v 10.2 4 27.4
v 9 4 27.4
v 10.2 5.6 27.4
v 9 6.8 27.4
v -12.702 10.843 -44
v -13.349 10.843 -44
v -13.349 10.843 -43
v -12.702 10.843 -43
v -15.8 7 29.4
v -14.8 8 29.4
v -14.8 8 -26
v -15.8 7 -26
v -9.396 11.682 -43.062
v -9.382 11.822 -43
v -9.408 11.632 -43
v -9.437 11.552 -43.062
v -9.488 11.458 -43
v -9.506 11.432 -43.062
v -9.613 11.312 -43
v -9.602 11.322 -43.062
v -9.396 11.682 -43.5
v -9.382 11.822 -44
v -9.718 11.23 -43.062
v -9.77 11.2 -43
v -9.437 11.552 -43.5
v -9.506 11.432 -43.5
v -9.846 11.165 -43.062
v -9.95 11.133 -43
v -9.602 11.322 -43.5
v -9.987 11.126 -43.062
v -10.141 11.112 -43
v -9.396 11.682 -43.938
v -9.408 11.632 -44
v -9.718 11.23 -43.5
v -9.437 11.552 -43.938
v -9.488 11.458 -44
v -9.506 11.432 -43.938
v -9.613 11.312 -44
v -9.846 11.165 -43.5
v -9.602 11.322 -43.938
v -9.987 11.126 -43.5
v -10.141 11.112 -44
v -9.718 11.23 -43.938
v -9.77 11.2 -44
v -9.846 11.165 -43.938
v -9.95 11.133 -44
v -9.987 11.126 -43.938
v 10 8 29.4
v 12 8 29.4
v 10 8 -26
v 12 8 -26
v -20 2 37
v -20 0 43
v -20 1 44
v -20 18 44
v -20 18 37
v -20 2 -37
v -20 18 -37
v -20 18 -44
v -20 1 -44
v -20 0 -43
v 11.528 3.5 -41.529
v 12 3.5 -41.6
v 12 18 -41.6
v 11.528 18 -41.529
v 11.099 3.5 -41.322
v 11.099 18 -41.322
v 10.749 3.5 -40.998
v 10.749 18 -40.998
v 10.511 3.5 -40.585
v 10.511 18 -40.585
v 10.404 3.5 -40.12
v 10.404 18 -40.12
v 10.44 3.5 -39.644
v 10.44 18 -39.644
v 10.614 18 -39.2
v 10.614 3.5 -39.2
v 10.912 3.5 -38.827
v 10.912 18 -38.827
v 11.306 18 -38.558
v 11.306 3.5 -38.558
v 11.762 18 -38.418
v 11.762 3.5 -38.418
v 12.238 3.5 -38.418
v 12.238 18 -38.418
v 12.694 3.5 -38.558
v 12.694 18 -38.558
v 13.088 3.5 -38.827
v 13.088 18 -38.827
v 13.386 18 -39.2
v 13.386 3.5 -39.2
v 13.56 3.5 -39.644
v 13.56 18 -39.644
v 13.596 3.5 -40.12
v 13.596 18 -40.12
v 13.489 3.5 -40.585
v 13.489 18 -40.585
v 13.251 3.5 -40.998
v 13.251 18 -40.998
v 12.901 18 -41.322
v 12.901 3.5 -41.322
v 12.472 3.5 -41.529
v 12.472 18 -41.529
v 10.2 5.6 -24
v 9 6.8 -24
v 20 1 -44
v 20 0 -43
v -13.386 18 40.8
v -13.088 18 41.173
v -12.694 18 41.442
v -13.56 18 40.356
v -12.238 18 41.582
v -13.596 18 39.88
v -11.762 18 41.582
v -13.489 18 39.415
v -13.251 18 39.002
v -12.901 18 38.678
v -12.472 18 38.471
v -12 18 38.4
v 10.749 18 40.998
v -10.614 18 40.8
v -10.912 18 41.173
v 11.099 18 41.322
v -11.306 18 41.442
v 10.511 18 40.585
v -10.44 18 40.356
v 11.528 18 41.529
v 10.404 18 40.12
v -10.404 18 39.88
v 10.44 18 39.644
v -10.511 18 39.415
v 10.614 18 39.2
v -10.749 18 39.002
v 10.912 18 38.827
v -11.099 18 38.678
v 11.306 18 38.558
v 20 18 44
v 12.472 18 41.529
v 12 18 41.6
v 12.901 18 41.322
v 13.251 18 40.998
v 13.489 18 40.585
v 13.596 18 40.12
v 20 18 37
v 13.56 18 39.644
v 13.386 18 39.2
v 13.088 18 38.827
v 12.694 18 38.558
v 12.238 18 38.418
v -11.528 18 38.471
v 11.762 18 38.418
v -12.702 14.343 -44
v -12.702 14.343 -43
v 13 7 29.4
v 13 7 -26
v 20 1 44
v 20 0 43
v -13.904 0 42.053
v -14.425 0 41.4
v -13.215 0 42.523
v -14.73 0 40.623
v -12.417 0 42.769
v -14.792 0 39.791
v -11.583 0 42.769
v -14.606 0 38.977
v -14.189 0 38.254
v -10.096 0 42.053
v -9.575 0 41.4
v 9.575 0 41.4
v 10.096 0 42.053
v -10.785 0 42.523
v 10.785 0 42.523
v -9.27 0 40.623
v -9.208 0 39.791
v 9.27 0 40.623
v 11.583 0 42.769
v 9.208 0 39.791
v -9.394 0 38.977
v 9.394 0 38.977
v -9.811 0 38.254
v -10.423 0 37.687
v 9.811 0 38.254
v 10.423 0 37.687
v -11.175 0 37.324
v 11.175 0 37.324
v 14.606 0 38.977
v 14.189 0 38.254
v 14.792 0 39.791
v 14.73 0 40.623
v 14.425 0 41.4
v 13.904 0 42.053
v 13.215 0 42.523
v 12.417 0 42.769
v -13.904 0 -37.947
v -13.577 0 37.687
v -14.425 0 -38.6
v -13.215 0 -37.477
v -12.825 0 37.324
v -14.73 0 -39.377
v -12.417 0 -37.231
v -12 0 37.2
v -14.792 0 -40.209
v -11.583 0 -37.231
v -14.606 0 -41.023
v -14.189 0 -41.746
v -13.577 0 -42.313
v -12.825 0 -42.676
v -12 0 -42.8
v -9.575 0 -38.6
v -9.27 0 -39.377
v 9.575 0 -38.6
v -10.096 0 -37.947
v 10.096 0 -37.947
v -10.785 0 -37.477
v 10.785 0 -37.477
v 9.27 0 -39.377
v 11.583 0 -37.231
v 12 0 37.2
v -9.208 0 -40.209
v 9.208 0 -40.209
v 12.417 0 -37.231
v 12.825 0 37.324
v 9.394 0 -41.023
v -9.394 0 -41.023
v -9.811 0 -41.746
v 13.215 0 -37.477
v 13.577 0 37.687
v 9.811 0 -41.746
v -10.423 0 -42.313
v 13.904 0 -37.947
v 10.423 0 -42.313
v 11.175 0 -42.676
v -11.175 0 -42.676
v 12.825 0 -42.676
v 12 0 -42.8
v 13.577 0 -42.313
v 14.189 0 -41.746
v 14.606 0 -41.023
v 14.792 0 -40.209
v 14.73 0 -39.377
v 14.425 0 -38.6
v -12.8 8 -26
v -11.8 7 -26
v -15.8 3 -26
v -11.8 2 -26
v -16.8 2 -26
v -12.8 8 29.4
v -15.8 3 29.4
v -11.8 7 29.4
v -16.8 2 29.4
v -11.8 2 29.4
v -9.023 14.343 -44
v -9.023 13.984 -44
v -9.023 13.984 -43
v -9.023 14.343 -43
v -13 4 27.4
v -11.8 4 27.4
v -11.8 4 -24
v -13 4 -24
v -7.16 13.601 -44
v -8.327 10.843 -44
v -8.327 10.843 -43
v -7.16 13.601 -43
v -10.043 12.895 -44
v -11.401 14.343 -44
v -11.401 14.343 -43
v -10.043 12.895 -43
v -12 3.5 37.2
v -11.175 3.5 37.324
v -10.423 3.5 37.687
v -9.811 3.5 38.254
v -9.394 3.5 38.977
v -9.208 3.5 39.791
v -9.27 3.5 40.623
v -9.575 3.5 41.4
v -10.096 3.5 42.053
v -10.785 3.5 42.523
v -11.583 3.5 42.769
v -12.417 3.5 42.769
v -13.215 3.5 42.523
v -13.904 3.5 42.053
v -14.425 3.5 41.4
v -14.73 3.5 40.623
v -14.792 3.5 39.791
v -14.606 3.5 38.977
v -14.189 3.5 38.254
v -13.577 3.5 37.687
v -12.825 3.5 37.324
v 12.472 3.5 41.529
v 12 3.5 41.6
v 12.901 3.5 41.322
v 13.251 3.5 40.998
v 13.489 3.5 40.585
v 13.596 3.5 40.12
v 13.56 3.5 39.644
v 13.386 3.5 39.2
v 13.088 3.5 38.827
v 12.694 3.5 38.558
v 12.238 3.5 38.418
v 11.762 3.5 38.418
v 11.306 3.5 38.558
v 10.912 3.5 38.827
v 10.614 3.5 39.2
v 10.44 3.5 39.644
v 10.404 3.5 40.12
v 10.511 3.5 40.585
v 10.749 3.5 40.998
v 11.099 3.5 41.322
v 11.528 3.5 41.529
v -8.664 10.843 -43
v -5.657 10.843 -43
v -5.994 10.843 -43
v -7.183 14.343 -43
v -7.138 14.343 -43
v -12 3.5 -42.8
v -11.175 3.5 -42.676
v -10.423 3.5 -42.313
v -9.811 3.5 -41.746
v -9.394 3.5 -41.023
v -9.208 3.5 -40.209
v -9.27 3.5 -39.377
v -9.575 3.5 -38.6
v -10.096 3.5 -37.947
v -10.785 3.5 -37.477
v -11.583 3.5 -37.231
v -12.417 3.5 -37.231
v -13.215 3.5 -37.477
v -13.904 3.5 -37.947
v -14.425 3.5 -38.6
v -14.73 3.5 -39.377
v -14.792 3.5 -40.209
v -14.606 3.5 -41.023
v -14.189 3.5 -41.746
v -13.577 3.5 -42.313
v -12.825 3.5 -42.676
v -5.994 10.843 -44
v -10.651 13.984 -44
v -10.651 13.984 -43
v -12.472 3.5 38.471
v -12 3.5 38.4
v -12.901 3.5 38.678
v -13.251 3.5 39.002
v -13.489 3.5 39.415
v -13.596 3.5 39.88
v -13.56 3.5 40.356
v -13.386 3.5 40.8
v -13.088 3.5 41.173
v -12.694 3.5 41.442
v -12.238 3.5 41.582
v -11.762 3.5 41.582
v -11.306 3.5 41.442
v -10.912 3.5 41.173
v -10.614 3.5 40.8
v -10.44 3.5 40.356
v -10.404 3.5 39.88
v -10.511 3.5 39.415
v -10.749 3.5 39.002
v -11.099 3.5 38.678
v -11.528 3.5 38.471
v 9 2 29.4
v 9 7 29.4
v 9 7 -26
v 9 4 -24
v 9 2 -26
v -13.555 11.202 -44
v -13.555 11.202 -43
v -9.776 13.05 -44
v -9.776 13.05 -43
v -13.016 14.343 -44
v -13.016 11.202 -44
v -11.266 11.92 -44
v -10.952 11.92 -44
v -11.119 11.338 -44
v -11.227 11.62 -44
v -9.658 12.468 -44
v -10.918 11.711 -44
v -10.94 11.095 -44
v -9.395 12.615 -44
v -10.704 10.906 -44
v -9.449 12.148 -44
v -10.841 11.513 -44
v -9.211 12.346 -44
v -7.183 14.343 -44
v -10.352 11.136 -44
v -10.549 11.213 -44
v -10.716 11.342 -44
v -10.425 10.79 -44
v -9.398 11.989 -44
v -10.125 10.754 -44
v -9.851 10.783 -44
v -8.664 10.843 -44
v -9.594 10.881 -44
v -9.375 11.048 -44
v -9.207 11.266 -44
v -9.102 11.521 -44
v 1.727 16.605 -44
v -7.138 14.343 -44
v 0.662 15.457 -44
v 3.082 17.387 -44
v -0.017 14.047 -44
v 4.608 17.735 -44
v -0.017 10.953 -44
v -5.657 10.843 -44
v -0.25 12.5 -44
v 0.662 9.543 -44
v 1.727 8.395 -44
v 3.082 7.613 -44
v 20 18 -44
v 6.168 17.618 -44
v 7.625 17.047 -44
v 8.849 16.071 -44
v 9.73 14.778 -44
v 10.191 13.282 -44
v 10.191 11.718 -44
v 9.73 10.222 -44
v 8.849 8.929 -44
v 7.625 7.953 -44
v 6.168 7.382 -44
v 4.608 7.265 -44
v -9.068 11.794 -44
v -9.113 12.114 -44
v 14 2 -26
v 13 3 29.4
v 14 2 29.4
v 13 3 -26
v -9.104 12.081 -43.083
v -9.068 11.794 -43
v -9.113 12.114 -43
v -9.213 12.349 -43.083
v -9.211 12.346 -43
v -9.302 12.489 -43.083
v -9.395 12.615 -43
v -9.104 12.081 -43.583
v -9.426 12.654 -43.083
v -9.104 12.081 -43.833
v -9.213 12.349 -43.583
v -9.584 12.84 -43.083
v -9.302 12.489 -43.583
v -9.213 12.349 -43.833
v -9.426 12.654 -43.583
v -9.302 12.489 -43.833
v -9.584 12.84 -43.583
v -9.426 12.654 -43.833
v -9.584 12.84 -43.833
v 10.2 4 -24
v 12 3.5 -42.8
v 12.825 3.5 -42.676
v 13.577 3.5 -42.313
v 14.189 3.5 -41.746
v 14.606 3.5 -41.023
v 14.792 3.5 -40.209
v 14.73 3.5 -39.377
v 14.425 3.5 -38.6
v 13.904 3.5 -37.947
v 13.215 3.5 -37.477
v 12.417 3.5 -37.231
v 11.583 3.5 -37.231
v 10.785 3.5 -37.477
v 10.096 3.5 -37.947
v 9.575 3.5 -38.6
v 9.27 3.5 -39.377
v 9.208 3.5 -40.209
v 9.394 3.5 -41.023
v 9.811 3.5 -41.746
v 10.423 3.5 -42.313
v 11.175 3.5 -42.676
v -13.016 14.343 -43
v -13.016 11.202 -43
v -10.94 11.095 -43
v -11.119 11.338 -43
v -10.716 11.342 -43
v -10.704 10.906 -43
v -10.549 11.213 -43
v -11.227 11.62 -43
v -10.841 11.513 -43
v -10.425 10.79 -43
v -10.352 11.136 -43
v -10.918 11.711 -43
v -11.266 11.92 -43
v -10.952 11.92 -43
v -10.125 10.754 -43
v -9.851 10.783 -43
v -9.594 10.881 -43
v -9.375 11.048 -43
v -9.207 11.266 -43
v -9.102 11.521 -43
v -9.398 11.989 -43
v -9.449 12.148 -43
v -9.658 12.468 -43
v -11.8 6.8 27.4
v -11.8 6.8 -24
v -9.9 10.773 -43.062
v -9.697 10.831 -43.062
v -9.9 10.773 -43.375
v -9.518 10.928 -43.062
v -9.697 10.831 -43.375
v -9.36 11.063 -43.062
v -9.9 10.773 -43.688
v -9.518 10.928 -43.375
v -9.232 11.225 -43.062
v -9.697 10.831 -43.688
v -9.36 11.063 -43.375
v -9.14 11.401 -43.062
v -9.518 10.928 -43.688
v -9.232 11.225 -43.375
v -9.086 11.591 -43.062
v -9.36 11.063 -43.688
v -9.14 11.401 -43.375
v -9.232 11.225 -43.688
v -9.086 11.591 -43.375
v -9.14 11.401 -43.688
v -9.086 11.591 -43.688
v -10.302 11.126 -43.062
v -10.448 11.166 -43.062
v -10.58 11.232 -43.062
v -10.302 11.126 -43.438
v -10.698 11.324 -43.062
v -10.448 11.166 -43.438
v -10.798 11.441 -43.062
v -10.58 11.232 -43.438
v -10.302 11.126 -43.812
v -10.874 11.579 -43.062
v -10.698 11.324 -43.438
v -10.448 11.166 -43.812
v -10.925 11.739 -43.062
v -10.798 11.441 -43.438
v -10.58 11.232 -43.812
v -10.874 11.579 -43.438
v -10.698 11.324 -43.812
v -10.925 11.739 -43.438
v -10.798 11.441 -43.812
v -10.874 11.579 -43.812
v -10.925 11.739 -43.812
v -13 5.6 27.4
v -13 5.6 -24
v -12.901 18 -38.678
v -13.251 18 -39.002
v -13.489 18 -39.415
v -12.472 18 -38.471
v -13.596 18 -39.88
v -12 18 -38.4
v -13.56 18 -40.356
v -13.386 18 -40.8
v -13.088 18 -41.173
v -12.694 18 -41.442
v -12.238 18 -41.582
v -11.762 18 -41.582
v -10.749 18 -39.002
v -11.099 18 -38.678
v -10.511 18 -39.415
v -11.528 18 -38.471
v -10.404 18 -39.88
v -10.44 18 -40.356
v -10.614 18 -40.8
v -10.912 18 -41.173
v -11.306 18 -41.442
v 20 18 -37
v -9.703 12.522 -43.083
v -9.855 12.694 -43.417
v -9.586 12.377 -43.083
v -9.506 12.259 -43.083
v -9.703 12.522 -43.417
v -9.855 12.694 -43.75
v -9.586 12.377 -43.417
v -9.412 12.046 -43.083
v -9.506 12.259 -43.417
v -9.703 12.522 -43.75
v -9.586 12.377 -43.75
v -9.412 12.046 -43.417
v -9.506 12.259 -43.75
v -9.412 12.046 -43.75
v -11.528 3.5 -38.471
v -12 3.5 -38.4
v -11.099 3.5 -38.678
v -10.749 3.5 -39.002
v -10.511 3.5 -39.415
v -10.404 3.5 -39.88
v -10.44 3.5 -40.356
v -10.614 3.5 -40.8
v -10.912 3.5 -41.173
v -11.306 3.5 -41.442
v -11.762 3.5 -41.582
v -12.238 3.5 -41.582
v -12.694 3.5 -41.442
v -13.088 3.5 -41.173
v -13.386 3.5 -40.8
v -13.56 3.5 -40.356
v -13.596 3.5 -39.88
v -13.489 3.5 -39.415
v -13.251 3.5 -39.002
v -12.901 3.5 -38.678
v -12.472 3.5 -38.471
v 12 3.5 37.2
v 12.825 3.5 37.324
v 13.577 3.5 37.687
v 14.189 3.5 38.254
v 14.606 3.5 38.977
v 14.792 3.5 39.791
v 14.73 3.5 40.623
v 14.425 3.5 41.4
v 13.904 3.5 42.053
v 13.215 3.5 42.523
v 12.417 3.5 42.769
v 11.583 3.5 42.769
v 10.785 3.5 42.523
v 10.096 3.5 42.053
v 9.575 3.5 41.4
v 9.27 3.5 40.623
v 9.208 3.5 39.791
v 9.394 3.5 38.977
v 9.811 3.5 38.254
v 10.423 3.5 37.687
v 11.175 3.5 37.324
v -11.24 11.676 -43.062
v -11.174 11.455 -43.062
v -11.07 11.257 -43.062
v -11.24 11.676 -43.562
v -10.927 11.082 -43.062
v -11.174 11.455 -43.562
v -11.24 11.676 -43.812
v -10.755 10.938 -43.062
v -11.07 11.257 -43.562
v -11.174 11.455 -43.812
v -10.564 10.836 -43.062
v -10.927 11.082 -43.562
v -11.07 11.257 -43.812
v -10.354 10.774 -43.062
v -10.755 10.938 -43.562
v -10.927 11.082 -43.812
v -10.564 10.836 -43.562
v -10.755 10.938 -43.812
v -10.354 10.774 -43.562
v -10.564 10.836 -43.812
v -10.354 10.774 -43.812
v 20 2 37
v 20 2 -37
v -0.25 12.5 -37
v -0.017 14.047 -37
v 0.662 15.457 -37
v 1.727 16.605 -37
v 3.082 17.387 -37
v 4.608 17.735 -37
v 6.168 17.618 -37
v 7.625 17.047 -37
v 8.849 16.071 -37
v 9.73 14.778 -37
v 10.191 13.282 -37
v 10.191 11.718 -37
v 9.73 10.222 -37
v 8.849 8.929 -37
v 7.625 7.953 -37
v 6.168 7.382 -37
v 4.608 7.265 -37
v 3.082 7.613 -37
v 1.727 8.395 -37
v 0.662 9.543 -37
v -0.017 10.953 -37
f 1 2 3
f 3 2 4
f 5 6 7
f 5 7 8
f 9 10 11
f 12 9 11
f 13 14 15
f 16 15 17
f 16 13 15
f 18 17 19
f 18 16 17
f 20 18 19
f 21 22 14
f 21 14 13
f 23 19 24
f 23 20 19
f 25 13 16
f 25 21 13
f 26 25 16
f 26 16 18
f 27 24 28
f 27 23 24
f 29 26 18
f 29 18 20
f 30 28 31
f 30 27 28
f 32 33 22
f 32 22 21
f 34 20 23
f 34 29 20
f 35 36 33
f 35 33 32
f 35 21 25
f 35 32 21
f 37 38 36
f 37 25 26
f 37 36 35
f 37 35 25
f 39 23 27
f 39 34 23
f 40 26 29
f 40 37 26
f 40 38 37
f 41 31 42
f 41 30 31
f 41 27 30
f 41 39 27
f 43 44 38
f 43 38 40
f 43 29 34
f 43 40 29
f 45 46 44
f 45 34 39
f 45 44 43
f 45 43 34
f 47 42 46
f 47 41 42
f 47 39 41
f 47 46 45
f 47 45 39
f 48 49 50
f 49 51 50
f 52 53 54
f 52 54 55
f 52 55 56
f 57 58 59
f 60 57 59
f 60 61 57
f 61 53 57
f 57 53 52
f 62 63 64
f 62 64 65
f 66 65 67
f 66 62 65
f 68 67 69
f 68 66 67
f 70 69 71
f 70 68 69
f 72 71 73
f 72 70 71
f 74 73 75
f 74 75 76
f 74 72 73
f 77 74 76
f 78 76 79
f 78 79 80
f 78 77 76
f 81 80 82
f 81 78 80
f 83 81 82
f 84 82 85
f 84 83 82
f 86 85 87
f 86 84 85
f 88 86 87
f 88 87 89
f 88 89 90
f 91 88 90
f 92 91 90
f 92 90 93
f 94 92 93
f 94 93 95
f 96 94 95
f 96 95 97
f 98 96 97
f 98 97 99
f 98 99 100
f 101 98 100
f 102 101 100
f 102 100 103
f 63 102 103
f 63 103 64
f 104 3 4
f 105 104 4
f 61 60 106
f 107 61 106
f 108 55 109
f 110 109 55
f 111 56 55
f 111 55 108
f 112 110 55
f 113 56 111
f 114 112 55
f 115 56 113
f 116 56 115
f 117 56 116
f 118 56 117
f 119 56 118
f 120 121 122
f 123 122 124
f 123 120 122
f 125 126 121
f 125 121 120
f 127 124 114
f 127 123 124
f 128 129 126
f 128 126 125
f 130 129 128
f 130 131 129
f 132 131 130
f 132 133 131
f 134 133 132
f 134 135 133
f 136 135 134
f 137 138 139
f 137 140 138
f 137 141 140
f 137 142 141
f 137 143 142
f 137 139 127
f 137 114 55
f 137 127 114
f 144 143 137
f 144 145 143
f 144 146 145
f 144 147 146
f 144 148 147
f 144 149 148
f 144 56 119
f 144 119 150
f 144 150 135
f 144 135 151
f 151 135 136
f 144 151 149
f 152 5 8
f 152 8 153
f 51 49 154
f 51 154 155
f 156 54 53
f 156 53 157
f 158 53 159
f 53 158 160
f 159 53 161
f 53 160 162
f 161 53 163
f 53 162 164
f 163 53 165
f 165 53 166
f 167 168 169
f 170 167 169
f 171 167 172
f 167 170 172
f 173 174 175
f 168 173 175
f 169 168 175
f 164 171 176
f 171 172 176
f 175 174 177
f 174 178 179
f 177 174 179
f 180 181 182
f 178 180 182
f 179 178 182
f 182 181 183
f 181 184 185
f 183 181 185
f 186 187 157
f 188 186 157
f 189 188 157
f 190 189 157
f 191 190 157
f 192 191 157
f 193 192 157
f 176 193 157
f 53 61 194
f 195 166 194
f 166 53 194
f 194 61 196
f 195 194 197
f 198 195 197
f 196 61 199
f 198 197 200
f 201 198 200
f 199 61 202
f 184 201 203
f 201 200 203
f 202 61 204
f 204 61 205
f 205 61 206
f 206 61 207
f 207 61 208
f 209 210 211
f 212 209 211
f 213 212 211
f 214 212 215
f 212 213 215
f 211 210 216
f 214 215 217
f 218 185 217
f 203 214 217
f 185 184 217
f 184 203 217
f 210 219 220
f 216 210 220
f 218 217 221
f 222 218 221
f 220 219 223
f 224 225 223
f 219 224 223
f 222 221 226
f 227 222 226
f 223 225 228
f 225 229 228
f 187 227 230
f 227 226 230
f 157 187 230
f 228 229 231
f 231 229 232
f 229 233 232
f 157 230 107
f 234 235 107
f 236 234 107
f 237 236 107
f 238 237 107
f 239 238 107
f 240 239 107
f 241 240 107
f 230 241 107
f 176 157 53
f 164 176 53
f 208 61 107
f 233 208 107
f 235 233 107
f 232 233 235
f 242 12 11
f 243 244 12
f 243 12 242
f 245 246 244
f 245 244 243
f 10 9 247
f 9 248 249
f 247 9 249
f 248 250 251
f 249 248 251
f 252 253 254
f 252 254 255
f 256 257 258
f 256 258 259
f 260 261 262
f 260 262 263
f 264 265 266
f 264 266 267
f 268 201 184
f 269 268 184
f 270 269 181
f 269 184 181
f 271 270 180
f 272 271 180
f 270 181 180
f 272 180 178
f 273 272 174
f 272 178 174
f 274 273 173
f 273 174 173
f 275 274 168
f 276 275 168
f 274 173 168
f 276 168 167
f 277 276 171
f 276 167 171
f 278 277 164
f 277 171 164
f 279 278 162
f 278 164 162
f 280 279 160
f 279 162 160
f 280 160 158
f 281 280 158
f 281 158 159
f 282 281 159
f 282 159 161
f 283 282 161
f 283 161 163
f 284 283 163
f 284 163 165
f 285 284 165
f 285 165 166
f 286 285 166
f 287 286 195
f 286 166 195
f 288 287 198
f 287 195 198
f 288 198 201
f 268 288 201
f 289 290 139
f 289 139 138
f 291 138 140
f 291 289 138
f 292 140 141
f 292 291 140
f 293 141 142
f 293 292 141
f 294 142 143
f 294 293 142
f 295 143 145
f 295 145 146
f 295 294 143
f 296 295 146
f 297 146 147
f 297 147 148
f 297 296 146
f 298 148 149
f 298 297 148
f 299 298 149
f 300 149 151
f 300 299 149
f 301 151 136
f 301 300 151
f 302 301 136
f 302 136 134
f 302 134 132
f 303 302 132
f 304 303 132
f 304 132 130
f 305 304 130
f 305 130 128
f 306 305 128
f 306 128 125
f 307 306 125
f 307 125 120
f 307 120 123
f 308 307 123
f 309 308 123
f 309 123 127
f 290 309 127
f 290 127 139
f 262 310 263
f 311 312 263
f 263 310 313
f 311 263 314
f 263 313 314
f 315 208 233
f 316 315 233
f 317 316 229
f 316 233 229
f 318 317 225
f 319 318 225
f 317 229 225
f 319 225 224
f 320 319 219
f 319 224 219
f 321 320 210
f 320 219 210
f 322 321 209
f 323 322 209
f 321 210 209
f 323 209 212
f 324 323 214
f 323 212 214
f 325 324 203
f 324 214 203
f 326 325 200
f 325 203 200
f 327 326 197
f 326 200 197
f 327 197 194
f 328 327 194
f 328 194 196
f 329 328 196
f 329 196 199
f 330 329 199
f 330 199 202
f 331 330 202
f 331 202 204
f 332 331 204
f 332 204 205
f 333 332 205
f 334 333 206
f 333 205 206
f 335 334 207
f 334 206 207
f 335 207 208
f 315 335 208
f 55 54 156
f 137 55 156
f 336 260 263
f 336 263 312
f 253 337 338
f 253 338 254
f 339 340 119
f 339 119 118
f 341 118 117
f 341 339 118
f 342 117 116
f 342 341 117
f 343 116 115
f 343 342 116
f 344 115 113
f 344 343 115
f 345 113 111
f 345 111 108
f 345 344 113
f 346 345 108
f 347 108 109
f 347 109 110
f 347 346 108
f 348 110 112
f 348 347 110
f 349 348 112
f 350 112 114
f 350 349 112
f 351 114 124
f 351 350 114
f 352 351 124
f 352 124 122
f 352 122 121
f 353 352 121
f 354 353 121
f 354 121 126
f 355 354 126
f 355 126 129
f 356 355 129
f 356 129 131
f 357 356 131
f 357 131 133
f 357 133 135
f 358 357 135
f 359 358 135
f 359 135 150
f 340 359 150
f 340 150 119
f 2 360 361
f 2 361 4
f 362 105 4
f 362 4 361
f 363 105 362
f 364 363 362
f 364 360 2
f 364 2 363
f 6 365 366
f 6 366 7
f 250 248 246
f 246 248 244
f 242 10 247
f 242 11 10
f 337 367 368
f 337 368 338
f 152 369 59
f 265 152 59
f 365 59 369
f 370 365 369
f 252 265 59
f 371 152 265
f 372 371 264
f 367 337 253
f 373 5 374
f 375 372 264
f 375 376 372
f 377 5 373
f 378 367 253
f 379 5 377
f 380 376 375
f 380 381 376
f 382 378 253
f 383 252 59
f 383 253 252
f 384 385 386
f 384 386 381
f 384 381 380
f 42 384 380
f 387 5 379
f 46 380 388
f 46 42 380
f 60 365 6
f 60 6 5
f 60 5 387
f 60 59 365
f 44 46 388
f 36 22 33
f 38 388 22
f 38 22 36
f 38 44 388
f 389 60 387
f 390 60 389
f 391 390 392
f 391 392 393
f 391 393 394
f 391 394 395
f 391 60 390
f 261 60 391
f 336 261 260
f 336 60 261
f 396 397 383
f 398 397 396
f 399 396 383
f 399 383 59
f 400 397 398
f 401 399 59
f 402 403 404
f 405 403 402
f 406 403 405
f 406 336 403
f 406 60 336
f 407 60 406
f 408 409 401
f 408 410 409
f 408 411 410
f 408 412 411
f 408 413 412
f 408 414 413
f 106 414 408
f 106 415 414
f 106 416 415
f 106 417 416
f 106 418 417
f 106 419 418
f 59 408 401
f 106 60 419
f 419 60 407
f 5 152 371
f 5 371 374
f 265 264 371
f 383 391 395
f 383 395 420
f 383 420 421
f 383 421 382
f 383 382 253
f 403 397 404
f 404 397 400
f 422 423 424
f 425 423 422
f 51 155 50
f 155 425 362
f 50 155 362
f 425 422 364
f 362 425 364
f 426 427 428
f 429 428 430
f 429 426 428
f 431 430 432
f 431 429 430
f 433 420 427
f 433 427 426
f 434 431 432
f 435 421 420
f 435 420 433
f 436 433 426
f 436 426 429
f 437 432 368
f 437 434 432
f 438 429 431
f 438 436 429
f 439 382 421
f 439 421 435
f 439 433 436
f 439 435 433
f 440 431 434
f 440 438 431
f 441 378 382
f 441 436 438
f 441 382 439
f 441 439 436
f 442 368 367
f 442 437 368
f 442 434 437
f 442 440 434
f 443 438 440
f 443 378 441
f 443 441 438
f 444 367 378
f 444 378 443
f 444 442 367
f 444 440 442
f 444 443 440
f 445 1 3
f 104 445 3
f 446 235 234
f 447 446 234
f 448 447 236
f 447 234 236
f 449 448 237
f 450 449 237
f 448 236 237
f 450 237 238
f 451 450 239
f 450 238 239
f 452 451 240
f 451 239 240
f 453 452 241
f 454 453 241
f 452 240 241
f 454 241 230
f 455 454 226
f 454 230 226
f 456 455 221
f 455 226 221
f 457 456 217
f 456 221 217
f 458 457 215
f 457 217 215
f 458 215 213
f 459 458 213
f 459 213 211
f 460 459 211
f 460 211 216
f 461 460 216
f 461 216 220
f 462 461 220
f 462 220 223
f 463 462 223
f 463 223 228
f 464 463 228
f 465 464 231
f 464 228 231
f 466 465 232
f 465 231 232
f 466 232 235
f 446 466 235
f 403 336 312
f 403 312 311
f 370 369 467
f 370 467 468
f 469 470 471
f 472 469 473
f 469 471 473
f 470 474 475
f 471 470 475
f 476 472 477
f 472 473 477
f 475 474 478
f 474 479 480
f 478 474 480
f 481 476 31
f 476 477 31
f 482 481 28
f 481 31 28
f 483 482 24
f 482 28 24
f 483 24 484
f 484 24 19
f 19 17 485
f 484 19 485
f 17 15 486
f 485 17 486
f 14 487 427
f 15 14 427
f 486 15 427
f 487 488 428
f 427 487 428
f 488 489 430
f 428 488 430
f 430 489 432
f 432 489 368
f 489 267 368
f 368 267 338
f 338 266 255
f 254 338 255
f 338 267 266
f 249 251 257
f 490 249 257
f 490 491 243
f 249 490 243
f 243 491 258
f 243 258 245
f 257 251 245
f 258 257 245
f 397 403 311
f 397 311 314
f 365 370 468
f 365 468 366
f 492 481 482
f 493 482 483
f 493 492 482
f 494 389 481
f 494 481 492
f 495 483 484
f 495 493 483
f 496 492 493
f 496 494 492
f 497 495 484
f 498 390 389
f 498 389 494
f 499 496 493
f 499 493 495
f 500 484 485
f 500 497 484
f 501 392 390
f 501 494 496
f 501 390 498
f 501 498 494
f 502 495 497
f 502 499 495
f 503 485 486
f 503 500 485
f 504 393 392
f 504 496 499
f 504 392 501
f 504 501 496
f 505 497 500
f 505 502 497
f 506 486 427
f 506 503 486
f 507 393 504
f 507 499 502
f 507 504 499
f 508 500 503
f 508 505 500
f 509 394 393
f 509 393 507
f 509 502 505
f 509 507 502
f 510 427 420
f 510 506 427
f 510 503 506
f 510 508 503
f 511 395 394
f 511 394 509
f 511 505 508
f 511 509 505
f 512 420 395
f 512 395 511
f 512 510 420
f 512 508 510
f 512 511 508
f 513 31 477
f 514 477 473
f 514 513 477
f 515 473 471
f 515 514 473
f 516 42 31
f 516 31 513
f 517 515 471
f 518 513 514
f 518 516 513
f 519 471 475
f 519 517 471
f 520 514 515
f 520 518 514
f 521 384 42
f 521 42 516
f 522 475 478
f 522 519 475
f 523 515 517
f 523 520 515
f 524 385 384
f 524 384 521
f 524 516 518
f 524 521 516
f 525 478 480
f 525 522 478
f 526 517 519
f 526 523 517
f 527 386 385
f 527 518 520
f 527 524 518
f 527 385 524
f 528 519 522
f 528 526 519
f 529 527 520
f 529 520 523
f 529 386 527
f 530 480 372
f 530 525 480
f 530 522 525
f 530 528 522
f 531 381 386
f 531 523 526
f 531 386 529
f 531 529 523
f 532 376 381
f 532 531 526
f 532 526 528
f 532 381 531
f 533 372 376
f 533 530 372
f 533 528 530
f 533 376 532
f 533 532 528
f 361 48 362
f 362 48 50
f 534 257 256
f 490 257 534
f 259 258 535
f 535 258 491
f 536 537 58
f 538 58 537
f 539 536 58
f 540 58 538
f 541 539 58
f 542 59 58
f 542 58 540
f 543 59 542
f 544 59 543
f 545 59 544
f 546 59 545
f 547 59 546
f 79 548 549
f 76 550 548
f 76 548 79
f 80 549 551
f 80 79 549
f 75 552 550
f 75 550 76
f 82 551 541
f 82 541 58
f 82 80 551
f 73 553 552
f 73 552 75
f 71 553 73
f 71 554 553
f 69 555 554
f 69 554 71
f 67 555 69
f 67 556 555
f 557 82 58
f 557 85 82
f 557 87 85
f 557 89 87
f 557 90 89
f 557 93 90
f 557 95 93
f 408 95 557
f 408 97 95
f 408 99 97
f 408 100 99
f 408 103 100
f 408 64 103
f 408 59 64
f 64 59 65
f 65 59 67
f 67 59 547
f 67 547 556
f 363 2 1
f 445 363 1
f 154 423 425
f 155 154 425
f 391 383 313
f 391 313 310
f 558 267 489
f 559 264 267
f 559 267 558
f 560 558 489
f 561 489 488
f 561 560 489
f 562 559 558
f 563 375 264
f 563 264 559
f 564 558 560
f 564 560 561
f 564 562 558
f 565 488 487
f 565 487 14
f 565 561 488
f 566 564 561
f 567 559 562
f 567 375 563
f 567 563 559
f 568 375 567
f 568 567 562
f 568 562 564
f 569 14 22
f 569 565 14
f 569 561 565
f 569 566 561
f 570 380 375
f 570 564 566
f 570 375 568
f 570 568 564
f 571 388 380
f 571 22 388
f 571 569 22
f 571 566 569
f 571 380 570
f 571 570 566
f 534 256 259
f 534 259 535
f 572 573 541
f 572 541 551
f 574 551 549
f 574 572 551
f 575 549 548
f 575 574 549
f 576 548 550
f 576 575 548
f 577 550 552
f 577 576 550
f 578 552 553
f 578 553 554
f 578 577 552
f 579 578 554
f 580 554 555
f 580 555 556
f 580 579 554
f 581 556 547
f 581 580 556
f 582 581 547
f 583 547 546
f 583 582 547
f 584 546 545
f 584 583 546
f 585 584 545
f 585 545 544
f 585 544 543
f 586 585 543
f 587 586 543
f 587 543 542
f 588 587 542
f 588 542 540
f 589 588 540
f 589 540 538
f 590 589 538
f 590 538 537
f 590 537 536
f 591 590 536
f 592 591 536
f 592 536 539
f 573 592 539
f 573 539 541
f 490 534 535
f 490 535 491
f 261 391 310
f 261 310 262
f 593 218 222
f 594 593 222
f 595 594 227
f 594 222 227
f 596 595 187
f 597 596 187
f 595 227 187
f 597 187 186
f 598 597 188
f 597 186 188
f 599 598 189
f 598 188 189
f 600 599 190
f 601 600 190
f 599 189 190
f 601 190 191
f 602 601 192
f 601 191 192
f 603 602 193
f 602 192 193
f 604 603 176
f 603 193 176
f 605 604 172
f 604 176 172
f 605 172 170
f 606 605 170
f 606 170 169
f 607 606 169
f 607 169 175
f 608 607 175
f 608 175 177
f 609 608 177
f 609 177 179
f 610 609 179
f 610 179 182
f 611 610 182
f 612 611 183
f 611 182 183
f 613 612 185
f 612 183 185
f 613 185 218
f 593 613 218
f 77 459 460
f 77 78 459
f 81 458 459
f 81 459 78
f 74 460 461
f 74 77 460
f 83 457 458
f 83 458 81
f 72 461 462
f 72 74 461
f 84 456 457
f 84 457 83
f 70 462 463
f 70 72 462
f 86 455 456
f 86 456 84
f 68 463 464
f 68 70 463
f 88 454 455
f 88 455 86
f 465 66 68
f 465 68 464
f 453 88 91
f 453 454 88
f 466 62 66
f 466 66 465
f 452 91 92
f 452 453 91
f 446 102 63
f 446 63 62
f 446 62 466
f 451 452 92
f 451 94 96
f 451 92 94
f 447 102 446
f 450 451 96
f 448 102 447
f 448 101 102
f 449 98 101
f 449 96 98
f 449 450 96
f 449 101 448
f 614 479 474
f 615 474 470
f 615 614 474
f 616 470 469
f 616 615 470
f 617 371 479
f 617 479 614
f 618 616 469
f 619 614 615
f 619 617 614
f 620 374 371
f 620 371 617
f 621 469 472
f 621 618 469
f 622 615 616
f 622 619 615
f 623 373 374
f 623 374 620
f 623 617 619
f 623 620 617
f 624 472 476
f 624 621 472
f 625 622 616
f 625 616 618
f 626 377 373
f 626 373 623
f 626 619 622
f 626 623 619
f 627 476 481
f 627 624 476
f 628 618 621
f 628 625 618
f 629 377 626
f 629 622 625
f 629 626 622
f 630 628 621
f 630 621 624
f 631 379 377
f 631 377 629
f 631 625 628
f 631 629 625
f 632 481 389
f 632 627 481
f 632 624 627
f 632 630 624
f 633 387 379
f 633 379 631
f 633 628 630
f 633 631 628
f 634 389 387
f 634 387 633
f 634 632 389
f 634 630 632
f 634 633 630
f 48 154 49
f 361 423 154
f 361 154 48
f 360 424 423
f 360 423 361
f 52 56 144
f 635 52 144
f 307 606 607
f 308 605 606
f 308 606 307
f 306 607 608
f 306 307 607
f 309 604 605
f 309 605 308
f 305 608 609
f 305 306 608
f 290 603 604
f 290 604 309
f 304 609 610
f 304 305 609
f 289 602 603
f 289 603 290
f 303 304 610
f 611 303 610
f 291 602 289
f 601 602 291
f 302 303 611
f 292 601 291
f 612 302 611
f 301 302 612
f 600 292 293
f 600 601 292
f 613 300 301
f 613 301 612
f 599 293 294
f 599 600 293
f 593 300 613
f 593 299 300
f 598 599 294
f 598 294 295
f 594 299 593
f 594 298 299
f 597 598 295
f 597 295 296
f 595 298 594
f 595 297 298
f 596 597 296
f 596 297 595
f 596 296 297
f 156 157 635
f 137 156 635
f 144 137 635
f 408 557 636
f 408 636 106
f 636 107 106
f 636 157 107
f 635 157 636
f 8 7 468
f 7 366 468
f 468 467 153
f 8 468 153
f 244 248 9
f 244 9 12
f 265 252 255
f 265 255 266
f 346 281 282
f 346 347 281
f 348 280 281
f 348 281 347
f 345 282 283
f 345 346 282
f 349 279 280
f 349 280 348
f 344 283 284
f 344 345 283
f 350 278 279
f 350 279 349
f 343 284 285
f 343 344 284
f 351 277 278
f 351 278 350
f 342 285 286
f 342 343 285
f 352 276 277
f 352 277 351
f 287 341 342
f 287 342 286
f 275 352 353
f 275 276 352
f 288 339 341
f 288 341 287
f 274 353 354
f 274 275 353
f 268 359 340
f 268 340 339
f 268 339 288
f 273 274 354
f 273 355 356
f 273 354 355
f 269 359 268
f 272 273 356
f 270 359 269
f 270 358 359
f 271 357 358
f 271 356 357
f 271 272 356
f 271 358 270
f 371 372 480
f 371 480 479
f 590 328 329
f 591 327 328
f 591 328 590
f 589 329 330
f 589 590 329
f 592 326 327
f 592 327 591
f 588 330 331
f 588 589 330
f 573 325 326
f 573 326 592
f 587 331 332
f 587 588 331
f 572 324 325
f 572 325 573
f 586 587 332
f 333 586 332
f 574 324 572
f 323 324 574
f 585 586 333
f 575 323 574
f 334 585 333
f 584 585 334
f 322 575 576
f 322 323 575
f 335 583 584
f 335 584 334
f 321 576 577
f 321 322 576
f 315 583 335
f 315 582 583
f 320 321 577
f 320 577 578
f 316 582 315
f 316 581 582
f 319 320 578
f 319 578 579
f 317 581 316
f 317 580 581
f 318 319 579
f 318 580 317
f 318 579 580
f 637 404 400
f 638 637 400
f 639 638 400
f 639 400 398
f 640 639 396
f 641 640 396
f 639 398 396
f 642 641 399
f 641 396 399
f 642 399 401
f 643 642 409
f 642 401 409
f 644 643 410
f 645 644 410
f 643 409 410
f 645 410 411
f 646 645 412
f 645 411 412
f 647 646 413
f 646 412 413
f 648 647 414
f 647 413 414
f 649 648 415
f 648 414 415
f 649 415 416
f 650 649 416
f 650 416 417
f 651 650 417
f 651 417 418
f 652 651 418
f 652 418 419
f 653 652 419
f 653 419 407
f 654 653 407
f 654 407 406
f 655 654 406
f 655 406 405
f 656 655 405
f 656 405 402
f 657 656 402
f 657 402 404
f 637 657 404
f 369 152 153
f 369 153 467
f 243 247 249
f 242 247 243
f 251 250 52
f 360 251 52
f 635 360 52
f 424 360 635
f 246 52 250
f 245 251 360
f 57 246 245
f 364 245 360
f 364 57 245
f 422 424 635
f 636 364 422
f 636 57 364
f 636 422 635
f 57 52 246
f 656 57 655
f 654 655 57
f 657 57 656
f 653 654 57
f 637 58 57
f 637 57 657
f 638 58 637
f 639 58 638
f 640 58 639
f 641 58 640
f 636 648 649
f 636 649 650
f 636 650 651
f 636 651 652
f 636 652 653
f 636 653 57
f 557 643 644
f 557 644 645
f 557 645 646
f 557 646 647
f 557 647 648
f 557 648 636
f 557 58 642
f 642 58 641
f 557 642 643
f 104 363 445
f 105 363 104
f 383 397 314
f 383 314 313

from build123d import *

# Parameters (mm, degrees)
CROQUIS1_W              = 40
CROQUIS1_H              = 88
CROQUIS1_R              = 1.6
SALIENTE_EXTRUIR1_DEPTH = 18
CROQUIS3_W              = 40
CROQUIS3_H              = 74
CORTAR_EXTRUIR1_DEPTH   = 16
CROQUIS4_W              = 4
CROQUIS4_H              = 55.4
SALIENTE_EXTRUIR2_DEPTH = 6
CORTAR_EXTRUIR2_START   = -2
CORTAR_EXTRUIR2_DEPTH   = 51.4
CORTAR_EXTRUIR3_REACH   = 94.022
CROQUIS6_R              = 5.25
CHAFL_N1_SIZE           = 1
CORTAR_EXTRUIR4_DEPTH   = 1
CHAFL_N2_SIZE           = 1
CROQUIS8_R              = 2.8
CORTAR_EXTRUIR5_DEPTH   = 3.5


with BuildPart() as part:
    # Croquis1 → Saliente-Extruir1 (new body)
    with BuildSketch(Plane(origin=(0, 0, 0), x_dir=(1, 0, 0), z_dir=(0, 1, 0))):
        Rectangle(CROQUIS1_W, CROQUIS1_H)
        with Locations(Location((-12, 40, 0), (0, 0, 270))):
            Circle(CROQUIS1_R, mode=Mode.SUBTRACT)
        with Locations(Location((12, 40, 0), (0, 0, 90))):
            Circle(CROQUIS1_R, mode=Mode.SUBTRACT)
        with Locations(Location((-12, -40, 0), (0, 0, 90))):
            Circle(CROQUIS1_R, mode=Mode.SUBTRACT)
        with Locations(Location((12, -40, 0), (0, 0, 270))):
            Circle(CROQUIS1_R, mode=Mode.SUBTRACT)
    extrude(amount=SALIENTE_EXTRUIR1_DEPTH)

    # Croquis3 → Cortar-Extruir1 (cut)
    with BuildSketch(Plane(origin=(0, 18, 0), x_dir=(1, 0, 0), z_dir=(0, 1, 0))):
        Rectangle(CROQUIS3_W, CROQUIS3_H)
    extrude(amount=-CORTAR_EXTRUIR1_DEPTH, mode=Mode.SUBTRACT)

    # Croquis4 → Saliente-Extruir2 (add)
    with BuildSketch(Plane(origin=(0, 2, 0), x_dir=(1, 0, 0), z_dir=(0, 1, 0))):
        with Locations((-13.8, -1.7)):
            Rectangle(CROQUIS4_W, CROQUIS4_H)
    saliente_extruir2 = extrude(amount=SALIENTE_EXTRUIR2_DEPTH)

    # Croquis5 → Cortar-Extruir2 (cut)
    with BuildSketch(Plane.XY.offset(29.4).offset(CORTAR_EXTRUIR2_START)):
        Polygon((-11.8, 4), (-13, 4), (-13, 5.6), (-11.8, 6.8), align=None)
    cortar_extruir2 = extrude(amount=-CORTAR_EXTRUIR2_DEPTH, mode=Mode.SUBTRACT)

    # Simetría1: Saliente-Extruir2, Cortar-Extruir2 across plane
    add(saliente_extruir2.mirror(Plane(origin=(-1.4, 0, 0), x_dir=(0, 0, 1), z_dir=(1, 0, 0))))
    add(cortar_extruir2.mirror(Plane(origin=(-1.4, 0, 0), x_dir=(0, 0, 1), z_dir=(1, 0, 0))), mode=Mode.SUBTRACT)

    # Croquis6 → Cortar-Extruir3 (cut, up to next)
    with BuildSketch(Plane(origin=(0, 0, -44), x_dir=(-1, 0, 0), z_dir=(0, 0, -1)), mode=Mode.PRIVATE) as cortar_extruir3_sk1:
        with Locations((-5, 12.5)):
            Circle(CROQUIS6_R)
    cortar_extruir3_tool1 = extrude(cortar_extruir3_sk1.sketch, amount=-CORTAR_EXTRUIR3_REACH, mode=Mode.PRIVATE) & part.part
    add(cortar_extruir3_tool1.solids().sort_by_distance((5, 12.5, -44))[0], mode=Mode.SUBTRACT)

    # Chaflán1
    chafl_n1_edges = [part.edges().sort_by_distance(p)[0] for p in [
        (-15.8, 2, 1.7),
        (-15.8, 8, 1.7),
        (-11.8, 8, 1.7),
        (13, 8, 1.7),
        (9, 8, 1.7),
        (13, 2, 1.7),
    ]]
    chamfer(chafl_n1_edges, length=CHAFL_N1_SIZE)

    # Croquis7 → Cortar-Extruir4 (cut)
    with BuildSketch(Plane(origin=(0, 0, -44), x_dir=(-1, 0, 0), z_dir=(0, 0, -1))):
        Polygon((13.349277552, 10.843260825), (12.702142135, 10.843260825), (12.702142135, 14.343260825), (13.016244699, 14.343260825), (13.016244699, 11.202235184), (13.554706238, 11.202235184), align=None)
        with BuildLine():
            Line((10.952142135, 11.920183902), (11.266244699, 11.920183902))
            add(Edge.make_bspline(
                [(11.266244699, 11.920183902), (11.264197895, 11.878512809), (11.260178025, 11.796671891), (11.241344805, 11.677350891), (11.214421773, 11.563285573), (11.176265555, 11.455453837), (11.12914596, 11.352567543), (11.07145794, 11.255992901), (11.004431311, 11.16477142), (10.928189034, 11.080630224), (10.845459137, 11.003714652), (10.756737301, 10.936591237), (10.662935418, 10.880527385), (10.564867085, 10.833404425), (10.461398114, 10.79807587), (10.353517551, 10.771851148), (10.240737789, 10.756075643), (10.163897853, 10.754379741), (10.124818417, 10.753517236)],
                knots=[0, 0, 0, 0, 1.100776268, 2.161895295, 3.184016182, 4.190939212, 5.176500551, 6.166955529, 7.155448256, 8.160289653, 9.16017456, 10.133824356, 11.091467644, 12.04088621, 13.000931625, 13.972173743, 14.968683325, 16, 16, 16, 16], degree=3))
            add(Edge.make_bspline(
                [(10.124818417, 10.753517236), (10.086437642, 10.754408401), (10.01102079, 10.756159509), (9.900996983, 10.771423682), (9.796007884, 10.794814665), (9.697243334, 10.829476418), (9.60368973, 10.872969336), (9.516505422, 10.927058477), (9.433582202, 10.989184526), (9.358989797, 11.062465248), (9.290467674, 11.140655962), (9.231405748, 11.224162988), (9.180541152, 11.310511825), (9.138910069, 11.400376981), (9.107351857, 11.494051102), (9.083970246, 11.590636102), (9.070604054, 11.691246638), (9.068563952, 11.759355152), (9.06752675, 11.793981979)],
                knots=[0, 0, 0, 0, 1.111674182, 2.184400057, 3.212814286, 4.223731311, 5.211378316, 6.196328225, 7.191884489, 8.207283132, 9.220262353, 10.201199469, 11.166417575, 12.120932471, 13.06540007, 14.026332106, 14.996573967, 16, 16, 16, 16], degree=3))
            add(Edge.make_bspline(
                [(9.06752675, 11.793981979), (9.06922004, 11.842729793), (9.072576904, 11.939369965), (9.10129089, 12.081385135), (9.146138886, 12.218977383), (9.200131458, 12.32971846), (9.254614612, 12.418943506), (9.303662739, 12.492443272), (9.36140823, 12.571561933), (9.427357734, 12.656619722), (9.502646994, 12.746502735), (9.585320007, 12.843044827), (9.67751183, 12.944460868), (9.742160462, 13.013774517), (9.775659763, 13.049691114)],
                knots=[0, 0, 0, 0, 1.184416499, 2.348048165, 3.509039915, 4.696071444, 5.333504901, 6.05069495, 6.844171097, 7.714965912, 8.667477798, 9.695072654, 10.805644396, 12, 12, 12, 12], degree=3))
            Line((9.775659763, 13.049691114), (10.651360885, 13.984286466))
            Line((10.651360885, 13.984286466), (9.022654955, 13.984286466))
            Line((9.022654955, 13.984286466), (9.022654955, 14.343260825))
            Line((9.022654955, 14.343260825), (11.400860084, 14.343260825))
            Line((11.400860084, 14.343260825), (10.043488289, 12.894743197))
            add(Edge.make_bspline(
                [(10.043488289, 12.894743197), (10.010438062, 12.860246772), (9.946955341, 12.7939862), (9.857203547, 12.697218484), (9.776462338, 12.607551149), (9.704678153, 12.524586855), (9.641791929, 12.448795933), (9.588004874, 12.379584429), (9.543079259, 12.317546294), (9.495467468, 12.244666486), (9.450066467, 12.155578956), (9.410163632, 12.047256962), (9.386006998, 11.935501368), (9.383094384, 11.860003118), (9.381629314, 11.822026851)],
                knots=[0, 0, 0, 0, 1.329530082, 2.553755191, 3.672934919, 4.687409497, 5.60679272, 6.413407421, 7.126401618, 7.737995624, 8.834647426, 9.90044882, 10.943907757, 12, 12, 12, 12], degree=3))
            add(Edge.make_bspline(
                [(9.381629314, 11.822026851), (9.382258526, 11.798142814), (9.383498582, 11.751071962), (9.394649978, 11.682104068), (9.411033592, 11.615318538), (9.436285803, 11.551541126), (9.466625403, 11.489517454), (9.505386481, 11.431133235), (9.549680213, 11.374398292), (9.601058771, 11.321258018), (9.65746288, 11.272573276), (9.717059065, 11.229450114), (9.780108664, 11.193410762), (9.846348922, 11.16386733), (9.915594355, 11.140691931), (9.98797911, 11.124633356), (10.063303123, 11.114550871), (10.114736619, 11.113186699), (10.140944218, 11.112491595)],
                knots=[0, 0, 0, 0, 0.991504627, 1.954065223, 2.895985987, 3.842598665, 4.797835564, 5.759220273, 6.74786863, 7.784730864, 8.824135544, 9.839918996, 10.835834653, 11.835434876, 12.84861661, 13.863796685, 14.911511676, 16, 16, 16, 16], degree=3))
            add(Edge.make_bspline(
                [(10.140944218, 11.112491595), (10.168322043, 11.113178196), (10.222087569, 11.114526567), (10.300857634, 11.124746109), (10.376527654, 11.140223083), (10.447931577, 11.1648623), (10.516563758, 11.193699284), (10.580673358, 11.231038105), (10.642061294, 11.273703483), (10.699493344, 11.323448604), (10.75180153, 11.379603353), (10.799386756, 11.440726805), (10.839706189, 11.507902554), (10.875497343, 11.5795187), (10.90287051, 11.657542834), (10.926272606, 11.740066779), (10.943271549, 11.82826796), (10.949136163, 11.889036378), (10.952142135, 11.920183902)],
                knots=[0, 0, 0, 0, 1.031072318, 2.024855787, 2.988461151, 3.935103592, 4.865765533, 5.788564469, 6.724086513, 7.67908574, 8.64457978, 9.611397706, 10.591395687, 11.591555111, 12.622101007, 13.700900657, 14.821571223, 16, 16, 16, 16], degree=3))
        make_face()
        Polygon((8.663680597, 10.843260825), (8.327142135, 10.843260825), (7.160475468, 13.601473966), (5.993808802, 10.843260825), (5.65727034, 10.843260825), (7.138039571, 14.343260825), (7.182911366, 14.343260825), align=None)
    extrude(amount=-CORTAR_EXTRUIR4_DEPTH, mode=Mode.SUBTRACT)

    # Chaflán2
    chafl_n2_edges = [part.edges().sort_by_distance(p)[0] for p in [
        (0, 0, 44),
        (0, 0, -44),
    ]]
    chamfer(chafl_n2_edges, length=CHAFL_N2_SIZE)

    # Croquis8 → Cortar-Extruir5 (cut)
    with BuildSketch(Plane.XZ):
        with Locations(Location((-12, 40, 0), (0, 0, 270))):
            Circle(CROQUIS8_R)
        with Locations(Location((12, 40, 0), (0, 0, 270))):
            Circle(CROQUIS8_R)
        with Locations(Location((-12, -40, 0), (0, 0, 270))):
            Circle(CROQUIS8_R)
        with Locations(Location((12, -40, 0), (0, 0, 270))):
            Circle(CROQUIS8_R)
    extrude(amount=-CORTAR_EXTRUIR5_DEPTH, mode=Mode.SUBTRACT)


solid = part.part
